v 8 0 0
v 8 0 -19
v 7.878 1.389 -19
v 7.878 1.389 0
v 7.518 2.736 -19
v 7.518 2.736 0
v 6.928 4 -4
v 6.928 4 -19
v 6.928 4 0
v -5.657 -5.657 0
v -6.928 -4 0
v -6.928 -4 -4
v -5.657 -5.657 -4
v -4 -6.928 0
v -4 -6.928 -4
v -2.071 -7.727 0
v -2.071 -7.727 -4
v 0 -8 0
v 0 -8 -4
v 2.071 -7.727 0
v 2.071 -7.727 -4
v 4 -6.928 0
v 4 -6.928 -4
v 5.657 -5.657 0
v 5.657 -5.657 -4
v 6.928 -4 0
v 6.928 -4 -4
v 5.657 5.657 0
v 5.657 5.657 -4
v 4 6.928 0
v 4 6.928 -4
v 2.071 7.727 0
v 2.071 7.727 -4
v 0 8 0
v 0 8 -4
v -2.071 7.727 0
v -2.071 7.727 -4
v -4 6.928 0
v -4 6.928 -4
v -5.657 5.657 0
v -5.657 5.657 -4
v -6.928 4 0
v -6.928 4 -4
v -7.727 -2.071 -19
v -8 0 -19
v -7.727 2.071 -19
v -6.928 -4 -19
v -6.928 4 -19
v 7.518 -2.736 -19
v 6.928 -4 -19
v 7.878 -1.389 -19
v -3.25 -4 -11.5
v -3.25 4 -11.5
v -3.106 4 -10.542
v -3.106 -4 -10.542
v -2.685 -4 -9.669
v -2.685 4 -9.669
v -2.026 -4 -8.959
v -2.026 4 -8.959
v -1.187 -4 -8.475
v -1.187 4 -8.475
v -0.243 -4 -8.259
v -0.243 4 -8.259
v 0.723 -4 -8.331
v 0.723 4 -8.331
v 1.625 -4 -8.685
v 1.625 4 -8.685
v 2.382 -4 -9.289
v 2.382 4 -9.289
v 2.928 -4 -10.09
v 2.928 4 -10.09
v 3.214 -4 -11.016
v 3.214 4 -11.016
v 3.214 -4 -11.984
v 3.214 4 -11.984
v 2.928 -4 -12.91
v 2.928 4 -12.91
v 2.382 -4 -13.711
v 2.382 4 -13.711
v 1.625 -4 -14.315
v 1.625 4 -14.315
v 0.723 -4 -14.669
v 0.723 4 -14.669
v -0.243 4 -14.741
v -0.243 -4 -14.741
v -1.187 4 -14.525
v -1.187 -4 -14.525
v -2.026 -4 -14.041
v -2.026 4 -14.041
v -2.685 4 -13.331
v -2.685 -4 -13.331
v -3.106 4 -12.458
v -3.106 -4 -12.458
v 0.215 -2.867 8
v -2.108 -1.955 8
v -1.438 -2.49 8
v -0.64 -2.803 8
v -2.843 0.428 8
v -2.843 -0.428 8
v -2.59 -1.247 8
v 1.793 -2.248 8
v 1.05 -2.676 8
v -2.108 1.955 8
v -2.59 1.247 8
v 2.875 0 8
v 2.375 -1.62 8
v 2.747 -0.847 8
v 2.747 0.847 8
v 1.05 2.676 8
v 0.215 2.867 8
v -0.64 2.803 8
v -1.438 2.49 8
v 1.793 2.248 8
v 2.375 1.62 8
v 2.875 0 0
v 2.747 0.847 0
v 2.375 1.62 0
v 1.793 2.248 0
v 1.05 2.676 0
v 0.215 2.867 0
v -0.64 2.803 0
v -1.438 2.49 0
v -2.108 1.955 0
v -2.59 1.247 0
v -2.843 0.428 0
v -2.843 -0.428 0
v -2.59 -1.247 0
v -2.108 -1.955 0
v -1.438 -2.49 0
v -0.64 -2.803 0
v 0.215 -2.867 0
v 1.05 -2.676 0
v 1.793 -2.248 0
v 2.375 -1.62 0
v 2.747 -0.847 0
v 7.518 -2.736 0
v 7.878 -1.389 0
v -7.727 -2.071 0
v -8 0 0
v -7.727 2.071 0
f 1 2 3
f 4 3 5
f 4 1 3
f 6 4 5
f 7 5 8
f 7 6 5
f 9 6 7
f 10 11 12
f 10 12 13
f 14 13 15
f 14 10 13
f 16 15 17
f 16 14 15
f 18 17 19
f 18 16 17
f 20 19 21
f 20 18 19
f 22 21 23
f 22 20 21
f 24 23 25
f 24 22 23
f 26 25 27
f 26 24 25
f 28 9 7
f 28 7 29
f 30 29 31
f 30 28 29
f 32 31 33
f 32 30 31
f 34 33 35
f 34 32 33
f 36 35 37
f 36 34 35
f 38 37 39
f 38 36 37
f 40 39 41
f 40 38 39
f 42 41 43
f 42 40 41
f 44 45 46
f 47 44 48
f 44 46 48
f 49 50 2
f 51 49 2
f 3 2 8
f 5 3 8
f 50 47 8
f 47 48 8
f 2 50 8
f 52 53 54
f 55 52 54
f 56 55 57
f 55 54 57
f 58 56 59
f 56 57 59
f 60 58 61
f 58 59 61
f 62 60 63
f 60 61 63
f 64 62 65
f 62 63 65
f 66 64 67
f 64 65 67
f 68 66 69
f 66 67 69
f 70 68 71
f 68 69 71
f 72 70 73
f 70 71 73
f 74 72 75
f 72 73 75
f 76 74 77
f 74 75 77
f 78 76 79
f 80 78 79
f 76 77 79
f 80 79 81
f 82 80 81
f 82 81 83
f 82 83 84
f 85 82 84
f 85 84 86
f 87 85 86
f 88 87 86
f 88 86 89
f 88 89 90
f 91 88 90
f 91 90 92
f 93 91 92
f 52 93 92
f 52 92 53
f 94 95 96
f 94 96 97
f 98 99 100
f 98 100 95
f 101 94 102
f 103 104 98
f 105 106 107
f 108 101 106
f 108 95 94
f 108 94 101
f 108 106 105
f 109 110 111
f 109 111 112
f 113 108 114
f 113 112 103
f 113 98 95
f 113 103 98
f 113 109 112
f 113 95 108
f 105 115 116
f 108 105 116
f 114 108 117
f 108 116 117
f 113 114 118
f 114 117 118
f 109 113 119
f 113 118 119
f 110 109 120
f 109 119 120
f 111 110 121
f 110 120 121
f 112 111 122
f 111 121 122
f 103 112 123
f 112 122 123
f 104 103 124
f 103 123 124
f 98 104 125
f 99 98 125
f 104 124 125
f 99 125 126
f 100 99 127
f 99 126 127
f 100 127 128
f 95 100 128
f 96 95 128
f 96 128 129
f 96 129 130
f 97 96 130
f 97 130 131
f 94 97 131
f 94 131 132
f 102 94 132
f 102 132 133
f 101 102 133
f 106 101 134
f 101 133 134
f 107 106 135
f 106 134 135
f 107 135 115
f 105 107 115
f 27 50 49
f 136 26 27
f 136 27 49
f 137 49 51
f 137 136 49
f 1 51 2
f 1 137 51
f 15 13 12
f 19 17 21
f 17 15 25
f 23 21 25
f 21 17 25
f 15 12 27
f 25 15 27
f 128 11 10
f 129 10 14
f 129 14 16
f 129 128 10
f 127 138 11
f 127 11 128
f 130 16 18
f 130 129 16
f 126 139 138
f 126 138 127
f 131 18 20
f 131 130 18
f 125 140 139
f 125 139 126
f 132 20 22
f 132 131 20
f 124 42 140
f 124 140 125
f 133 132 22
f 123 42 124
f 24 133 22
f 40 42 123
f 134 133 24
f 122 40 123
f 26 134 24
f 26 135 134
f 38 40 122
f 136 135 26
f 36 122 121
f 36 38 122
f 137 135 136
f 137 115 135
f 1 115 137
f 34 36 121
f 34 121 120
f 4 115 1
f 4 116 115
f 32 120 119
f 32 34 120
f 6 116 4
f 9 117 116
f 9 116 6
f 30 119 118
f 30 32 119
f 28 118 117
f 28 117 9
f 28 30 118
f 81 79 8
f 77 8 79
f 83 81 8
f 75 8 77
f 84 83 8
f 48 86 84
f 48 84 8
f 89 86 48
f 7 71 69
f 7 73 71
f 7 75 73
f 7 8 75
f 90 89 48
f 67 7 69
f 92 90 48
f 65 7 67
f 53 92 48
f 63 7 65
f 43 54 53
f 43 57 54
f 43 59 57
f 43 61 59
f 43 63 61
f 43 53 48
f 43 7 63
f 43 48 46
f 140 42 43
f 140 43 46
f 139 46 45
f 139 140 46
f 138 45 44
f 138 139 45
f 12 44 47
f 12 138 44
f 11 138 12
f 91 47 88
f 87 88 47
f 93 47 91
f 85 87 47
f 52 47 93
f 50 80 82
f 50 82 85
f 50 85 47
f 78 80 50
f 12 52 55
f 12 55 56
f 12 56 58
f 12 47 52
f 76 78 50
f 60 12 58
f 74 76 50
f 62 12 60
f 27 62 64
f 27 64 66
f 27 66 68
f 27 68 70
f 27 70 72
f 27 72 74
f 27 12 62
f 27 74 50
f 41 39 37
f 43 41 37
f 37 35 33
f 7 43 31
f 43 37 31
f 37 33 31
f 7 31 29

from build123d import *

# Parameters (mm, degrees)
F0_R     = 2.875
F1_DEPTH = 8
F2_DEPTH = 4
F3_DEPTH = 19
F4_R     = 3.25
F5_DEPTH = 25


with BuildPart() as f1:
    # F0 (on Top) → F1 (new body)
    with BuildSketch(Plane.XY):
        Circle(F0_R)
    extrude(amount=F1_DEPTH)

    # F0 (on Top) → F2 (join)
    with BuildSketch(Plane.XY):
        with BuildLine():
            ThreePointArc((-6.928203, -4), (0, -8), (6.928203, -4))
            Line((6.928203, -4), (-6.928203, -4))
        make_face()
        with BuildLine():
            Line((-6.928203, 4), (6.928203, 4))
            ThreePointArc((6.928203, 4), (0, 8), (-6.928203, 4))
        make_face()
        with BuildLine():
            ThreePointArc((6.928203, -4), (7.727407, -2.070552), (8, 0))
            ThreePointArc((8, 0), (7.727407, 2.070552), (6.928203, 4))
            Line((6.928203, 4), (-6.928203, 4))
            ThreePointArc((-6.928203, 4), (-8, 0), (-6.928203, -4))
            Line((-6.928203, -4), (6.928203, -4))
        make_face()
        Circle(F0_R, mode=Mode.SUBTRACT)
        Circle(F0_R)
    extrude(amount=-F2_DEPTH)

    # F0 (on Top) → F3 (join)
    with BuildSketch(Plane.XY):
        with BuildLine():
            ThreePointArc((6.928203, -4), (7.727407, -2.070552), (8, 0))
            ThreePointArc((8, 0), (7.727407, 2.070552), (6.928203, 4))
            Line((6.928203, 4), (-6.928203, 4))
            ThreePointArc((-6.928203, 4), (-8, 0), (-6.928203, -4))
            Line((-6.928203, -4), (6.928203, -4))
        make_face()
        Circle(F0_R, mode=Mode.SUBTRACT)
        Circle(F0_R)
    extrude(amount=-F3_DEPTH)

    # F4 (on face) → F5 (cut)
    with BuildSketch(Plane(origin=(0, 4, 0), x_dir=(-1, 0, 0), z_dir=(0, 1, 0))):
        with Locations((0, -11.5)):
            Circle(F4_R)
    extrude(amount=-F5_DEPTH, mode=Mode.SUBTRACT)


solid = f1.part
